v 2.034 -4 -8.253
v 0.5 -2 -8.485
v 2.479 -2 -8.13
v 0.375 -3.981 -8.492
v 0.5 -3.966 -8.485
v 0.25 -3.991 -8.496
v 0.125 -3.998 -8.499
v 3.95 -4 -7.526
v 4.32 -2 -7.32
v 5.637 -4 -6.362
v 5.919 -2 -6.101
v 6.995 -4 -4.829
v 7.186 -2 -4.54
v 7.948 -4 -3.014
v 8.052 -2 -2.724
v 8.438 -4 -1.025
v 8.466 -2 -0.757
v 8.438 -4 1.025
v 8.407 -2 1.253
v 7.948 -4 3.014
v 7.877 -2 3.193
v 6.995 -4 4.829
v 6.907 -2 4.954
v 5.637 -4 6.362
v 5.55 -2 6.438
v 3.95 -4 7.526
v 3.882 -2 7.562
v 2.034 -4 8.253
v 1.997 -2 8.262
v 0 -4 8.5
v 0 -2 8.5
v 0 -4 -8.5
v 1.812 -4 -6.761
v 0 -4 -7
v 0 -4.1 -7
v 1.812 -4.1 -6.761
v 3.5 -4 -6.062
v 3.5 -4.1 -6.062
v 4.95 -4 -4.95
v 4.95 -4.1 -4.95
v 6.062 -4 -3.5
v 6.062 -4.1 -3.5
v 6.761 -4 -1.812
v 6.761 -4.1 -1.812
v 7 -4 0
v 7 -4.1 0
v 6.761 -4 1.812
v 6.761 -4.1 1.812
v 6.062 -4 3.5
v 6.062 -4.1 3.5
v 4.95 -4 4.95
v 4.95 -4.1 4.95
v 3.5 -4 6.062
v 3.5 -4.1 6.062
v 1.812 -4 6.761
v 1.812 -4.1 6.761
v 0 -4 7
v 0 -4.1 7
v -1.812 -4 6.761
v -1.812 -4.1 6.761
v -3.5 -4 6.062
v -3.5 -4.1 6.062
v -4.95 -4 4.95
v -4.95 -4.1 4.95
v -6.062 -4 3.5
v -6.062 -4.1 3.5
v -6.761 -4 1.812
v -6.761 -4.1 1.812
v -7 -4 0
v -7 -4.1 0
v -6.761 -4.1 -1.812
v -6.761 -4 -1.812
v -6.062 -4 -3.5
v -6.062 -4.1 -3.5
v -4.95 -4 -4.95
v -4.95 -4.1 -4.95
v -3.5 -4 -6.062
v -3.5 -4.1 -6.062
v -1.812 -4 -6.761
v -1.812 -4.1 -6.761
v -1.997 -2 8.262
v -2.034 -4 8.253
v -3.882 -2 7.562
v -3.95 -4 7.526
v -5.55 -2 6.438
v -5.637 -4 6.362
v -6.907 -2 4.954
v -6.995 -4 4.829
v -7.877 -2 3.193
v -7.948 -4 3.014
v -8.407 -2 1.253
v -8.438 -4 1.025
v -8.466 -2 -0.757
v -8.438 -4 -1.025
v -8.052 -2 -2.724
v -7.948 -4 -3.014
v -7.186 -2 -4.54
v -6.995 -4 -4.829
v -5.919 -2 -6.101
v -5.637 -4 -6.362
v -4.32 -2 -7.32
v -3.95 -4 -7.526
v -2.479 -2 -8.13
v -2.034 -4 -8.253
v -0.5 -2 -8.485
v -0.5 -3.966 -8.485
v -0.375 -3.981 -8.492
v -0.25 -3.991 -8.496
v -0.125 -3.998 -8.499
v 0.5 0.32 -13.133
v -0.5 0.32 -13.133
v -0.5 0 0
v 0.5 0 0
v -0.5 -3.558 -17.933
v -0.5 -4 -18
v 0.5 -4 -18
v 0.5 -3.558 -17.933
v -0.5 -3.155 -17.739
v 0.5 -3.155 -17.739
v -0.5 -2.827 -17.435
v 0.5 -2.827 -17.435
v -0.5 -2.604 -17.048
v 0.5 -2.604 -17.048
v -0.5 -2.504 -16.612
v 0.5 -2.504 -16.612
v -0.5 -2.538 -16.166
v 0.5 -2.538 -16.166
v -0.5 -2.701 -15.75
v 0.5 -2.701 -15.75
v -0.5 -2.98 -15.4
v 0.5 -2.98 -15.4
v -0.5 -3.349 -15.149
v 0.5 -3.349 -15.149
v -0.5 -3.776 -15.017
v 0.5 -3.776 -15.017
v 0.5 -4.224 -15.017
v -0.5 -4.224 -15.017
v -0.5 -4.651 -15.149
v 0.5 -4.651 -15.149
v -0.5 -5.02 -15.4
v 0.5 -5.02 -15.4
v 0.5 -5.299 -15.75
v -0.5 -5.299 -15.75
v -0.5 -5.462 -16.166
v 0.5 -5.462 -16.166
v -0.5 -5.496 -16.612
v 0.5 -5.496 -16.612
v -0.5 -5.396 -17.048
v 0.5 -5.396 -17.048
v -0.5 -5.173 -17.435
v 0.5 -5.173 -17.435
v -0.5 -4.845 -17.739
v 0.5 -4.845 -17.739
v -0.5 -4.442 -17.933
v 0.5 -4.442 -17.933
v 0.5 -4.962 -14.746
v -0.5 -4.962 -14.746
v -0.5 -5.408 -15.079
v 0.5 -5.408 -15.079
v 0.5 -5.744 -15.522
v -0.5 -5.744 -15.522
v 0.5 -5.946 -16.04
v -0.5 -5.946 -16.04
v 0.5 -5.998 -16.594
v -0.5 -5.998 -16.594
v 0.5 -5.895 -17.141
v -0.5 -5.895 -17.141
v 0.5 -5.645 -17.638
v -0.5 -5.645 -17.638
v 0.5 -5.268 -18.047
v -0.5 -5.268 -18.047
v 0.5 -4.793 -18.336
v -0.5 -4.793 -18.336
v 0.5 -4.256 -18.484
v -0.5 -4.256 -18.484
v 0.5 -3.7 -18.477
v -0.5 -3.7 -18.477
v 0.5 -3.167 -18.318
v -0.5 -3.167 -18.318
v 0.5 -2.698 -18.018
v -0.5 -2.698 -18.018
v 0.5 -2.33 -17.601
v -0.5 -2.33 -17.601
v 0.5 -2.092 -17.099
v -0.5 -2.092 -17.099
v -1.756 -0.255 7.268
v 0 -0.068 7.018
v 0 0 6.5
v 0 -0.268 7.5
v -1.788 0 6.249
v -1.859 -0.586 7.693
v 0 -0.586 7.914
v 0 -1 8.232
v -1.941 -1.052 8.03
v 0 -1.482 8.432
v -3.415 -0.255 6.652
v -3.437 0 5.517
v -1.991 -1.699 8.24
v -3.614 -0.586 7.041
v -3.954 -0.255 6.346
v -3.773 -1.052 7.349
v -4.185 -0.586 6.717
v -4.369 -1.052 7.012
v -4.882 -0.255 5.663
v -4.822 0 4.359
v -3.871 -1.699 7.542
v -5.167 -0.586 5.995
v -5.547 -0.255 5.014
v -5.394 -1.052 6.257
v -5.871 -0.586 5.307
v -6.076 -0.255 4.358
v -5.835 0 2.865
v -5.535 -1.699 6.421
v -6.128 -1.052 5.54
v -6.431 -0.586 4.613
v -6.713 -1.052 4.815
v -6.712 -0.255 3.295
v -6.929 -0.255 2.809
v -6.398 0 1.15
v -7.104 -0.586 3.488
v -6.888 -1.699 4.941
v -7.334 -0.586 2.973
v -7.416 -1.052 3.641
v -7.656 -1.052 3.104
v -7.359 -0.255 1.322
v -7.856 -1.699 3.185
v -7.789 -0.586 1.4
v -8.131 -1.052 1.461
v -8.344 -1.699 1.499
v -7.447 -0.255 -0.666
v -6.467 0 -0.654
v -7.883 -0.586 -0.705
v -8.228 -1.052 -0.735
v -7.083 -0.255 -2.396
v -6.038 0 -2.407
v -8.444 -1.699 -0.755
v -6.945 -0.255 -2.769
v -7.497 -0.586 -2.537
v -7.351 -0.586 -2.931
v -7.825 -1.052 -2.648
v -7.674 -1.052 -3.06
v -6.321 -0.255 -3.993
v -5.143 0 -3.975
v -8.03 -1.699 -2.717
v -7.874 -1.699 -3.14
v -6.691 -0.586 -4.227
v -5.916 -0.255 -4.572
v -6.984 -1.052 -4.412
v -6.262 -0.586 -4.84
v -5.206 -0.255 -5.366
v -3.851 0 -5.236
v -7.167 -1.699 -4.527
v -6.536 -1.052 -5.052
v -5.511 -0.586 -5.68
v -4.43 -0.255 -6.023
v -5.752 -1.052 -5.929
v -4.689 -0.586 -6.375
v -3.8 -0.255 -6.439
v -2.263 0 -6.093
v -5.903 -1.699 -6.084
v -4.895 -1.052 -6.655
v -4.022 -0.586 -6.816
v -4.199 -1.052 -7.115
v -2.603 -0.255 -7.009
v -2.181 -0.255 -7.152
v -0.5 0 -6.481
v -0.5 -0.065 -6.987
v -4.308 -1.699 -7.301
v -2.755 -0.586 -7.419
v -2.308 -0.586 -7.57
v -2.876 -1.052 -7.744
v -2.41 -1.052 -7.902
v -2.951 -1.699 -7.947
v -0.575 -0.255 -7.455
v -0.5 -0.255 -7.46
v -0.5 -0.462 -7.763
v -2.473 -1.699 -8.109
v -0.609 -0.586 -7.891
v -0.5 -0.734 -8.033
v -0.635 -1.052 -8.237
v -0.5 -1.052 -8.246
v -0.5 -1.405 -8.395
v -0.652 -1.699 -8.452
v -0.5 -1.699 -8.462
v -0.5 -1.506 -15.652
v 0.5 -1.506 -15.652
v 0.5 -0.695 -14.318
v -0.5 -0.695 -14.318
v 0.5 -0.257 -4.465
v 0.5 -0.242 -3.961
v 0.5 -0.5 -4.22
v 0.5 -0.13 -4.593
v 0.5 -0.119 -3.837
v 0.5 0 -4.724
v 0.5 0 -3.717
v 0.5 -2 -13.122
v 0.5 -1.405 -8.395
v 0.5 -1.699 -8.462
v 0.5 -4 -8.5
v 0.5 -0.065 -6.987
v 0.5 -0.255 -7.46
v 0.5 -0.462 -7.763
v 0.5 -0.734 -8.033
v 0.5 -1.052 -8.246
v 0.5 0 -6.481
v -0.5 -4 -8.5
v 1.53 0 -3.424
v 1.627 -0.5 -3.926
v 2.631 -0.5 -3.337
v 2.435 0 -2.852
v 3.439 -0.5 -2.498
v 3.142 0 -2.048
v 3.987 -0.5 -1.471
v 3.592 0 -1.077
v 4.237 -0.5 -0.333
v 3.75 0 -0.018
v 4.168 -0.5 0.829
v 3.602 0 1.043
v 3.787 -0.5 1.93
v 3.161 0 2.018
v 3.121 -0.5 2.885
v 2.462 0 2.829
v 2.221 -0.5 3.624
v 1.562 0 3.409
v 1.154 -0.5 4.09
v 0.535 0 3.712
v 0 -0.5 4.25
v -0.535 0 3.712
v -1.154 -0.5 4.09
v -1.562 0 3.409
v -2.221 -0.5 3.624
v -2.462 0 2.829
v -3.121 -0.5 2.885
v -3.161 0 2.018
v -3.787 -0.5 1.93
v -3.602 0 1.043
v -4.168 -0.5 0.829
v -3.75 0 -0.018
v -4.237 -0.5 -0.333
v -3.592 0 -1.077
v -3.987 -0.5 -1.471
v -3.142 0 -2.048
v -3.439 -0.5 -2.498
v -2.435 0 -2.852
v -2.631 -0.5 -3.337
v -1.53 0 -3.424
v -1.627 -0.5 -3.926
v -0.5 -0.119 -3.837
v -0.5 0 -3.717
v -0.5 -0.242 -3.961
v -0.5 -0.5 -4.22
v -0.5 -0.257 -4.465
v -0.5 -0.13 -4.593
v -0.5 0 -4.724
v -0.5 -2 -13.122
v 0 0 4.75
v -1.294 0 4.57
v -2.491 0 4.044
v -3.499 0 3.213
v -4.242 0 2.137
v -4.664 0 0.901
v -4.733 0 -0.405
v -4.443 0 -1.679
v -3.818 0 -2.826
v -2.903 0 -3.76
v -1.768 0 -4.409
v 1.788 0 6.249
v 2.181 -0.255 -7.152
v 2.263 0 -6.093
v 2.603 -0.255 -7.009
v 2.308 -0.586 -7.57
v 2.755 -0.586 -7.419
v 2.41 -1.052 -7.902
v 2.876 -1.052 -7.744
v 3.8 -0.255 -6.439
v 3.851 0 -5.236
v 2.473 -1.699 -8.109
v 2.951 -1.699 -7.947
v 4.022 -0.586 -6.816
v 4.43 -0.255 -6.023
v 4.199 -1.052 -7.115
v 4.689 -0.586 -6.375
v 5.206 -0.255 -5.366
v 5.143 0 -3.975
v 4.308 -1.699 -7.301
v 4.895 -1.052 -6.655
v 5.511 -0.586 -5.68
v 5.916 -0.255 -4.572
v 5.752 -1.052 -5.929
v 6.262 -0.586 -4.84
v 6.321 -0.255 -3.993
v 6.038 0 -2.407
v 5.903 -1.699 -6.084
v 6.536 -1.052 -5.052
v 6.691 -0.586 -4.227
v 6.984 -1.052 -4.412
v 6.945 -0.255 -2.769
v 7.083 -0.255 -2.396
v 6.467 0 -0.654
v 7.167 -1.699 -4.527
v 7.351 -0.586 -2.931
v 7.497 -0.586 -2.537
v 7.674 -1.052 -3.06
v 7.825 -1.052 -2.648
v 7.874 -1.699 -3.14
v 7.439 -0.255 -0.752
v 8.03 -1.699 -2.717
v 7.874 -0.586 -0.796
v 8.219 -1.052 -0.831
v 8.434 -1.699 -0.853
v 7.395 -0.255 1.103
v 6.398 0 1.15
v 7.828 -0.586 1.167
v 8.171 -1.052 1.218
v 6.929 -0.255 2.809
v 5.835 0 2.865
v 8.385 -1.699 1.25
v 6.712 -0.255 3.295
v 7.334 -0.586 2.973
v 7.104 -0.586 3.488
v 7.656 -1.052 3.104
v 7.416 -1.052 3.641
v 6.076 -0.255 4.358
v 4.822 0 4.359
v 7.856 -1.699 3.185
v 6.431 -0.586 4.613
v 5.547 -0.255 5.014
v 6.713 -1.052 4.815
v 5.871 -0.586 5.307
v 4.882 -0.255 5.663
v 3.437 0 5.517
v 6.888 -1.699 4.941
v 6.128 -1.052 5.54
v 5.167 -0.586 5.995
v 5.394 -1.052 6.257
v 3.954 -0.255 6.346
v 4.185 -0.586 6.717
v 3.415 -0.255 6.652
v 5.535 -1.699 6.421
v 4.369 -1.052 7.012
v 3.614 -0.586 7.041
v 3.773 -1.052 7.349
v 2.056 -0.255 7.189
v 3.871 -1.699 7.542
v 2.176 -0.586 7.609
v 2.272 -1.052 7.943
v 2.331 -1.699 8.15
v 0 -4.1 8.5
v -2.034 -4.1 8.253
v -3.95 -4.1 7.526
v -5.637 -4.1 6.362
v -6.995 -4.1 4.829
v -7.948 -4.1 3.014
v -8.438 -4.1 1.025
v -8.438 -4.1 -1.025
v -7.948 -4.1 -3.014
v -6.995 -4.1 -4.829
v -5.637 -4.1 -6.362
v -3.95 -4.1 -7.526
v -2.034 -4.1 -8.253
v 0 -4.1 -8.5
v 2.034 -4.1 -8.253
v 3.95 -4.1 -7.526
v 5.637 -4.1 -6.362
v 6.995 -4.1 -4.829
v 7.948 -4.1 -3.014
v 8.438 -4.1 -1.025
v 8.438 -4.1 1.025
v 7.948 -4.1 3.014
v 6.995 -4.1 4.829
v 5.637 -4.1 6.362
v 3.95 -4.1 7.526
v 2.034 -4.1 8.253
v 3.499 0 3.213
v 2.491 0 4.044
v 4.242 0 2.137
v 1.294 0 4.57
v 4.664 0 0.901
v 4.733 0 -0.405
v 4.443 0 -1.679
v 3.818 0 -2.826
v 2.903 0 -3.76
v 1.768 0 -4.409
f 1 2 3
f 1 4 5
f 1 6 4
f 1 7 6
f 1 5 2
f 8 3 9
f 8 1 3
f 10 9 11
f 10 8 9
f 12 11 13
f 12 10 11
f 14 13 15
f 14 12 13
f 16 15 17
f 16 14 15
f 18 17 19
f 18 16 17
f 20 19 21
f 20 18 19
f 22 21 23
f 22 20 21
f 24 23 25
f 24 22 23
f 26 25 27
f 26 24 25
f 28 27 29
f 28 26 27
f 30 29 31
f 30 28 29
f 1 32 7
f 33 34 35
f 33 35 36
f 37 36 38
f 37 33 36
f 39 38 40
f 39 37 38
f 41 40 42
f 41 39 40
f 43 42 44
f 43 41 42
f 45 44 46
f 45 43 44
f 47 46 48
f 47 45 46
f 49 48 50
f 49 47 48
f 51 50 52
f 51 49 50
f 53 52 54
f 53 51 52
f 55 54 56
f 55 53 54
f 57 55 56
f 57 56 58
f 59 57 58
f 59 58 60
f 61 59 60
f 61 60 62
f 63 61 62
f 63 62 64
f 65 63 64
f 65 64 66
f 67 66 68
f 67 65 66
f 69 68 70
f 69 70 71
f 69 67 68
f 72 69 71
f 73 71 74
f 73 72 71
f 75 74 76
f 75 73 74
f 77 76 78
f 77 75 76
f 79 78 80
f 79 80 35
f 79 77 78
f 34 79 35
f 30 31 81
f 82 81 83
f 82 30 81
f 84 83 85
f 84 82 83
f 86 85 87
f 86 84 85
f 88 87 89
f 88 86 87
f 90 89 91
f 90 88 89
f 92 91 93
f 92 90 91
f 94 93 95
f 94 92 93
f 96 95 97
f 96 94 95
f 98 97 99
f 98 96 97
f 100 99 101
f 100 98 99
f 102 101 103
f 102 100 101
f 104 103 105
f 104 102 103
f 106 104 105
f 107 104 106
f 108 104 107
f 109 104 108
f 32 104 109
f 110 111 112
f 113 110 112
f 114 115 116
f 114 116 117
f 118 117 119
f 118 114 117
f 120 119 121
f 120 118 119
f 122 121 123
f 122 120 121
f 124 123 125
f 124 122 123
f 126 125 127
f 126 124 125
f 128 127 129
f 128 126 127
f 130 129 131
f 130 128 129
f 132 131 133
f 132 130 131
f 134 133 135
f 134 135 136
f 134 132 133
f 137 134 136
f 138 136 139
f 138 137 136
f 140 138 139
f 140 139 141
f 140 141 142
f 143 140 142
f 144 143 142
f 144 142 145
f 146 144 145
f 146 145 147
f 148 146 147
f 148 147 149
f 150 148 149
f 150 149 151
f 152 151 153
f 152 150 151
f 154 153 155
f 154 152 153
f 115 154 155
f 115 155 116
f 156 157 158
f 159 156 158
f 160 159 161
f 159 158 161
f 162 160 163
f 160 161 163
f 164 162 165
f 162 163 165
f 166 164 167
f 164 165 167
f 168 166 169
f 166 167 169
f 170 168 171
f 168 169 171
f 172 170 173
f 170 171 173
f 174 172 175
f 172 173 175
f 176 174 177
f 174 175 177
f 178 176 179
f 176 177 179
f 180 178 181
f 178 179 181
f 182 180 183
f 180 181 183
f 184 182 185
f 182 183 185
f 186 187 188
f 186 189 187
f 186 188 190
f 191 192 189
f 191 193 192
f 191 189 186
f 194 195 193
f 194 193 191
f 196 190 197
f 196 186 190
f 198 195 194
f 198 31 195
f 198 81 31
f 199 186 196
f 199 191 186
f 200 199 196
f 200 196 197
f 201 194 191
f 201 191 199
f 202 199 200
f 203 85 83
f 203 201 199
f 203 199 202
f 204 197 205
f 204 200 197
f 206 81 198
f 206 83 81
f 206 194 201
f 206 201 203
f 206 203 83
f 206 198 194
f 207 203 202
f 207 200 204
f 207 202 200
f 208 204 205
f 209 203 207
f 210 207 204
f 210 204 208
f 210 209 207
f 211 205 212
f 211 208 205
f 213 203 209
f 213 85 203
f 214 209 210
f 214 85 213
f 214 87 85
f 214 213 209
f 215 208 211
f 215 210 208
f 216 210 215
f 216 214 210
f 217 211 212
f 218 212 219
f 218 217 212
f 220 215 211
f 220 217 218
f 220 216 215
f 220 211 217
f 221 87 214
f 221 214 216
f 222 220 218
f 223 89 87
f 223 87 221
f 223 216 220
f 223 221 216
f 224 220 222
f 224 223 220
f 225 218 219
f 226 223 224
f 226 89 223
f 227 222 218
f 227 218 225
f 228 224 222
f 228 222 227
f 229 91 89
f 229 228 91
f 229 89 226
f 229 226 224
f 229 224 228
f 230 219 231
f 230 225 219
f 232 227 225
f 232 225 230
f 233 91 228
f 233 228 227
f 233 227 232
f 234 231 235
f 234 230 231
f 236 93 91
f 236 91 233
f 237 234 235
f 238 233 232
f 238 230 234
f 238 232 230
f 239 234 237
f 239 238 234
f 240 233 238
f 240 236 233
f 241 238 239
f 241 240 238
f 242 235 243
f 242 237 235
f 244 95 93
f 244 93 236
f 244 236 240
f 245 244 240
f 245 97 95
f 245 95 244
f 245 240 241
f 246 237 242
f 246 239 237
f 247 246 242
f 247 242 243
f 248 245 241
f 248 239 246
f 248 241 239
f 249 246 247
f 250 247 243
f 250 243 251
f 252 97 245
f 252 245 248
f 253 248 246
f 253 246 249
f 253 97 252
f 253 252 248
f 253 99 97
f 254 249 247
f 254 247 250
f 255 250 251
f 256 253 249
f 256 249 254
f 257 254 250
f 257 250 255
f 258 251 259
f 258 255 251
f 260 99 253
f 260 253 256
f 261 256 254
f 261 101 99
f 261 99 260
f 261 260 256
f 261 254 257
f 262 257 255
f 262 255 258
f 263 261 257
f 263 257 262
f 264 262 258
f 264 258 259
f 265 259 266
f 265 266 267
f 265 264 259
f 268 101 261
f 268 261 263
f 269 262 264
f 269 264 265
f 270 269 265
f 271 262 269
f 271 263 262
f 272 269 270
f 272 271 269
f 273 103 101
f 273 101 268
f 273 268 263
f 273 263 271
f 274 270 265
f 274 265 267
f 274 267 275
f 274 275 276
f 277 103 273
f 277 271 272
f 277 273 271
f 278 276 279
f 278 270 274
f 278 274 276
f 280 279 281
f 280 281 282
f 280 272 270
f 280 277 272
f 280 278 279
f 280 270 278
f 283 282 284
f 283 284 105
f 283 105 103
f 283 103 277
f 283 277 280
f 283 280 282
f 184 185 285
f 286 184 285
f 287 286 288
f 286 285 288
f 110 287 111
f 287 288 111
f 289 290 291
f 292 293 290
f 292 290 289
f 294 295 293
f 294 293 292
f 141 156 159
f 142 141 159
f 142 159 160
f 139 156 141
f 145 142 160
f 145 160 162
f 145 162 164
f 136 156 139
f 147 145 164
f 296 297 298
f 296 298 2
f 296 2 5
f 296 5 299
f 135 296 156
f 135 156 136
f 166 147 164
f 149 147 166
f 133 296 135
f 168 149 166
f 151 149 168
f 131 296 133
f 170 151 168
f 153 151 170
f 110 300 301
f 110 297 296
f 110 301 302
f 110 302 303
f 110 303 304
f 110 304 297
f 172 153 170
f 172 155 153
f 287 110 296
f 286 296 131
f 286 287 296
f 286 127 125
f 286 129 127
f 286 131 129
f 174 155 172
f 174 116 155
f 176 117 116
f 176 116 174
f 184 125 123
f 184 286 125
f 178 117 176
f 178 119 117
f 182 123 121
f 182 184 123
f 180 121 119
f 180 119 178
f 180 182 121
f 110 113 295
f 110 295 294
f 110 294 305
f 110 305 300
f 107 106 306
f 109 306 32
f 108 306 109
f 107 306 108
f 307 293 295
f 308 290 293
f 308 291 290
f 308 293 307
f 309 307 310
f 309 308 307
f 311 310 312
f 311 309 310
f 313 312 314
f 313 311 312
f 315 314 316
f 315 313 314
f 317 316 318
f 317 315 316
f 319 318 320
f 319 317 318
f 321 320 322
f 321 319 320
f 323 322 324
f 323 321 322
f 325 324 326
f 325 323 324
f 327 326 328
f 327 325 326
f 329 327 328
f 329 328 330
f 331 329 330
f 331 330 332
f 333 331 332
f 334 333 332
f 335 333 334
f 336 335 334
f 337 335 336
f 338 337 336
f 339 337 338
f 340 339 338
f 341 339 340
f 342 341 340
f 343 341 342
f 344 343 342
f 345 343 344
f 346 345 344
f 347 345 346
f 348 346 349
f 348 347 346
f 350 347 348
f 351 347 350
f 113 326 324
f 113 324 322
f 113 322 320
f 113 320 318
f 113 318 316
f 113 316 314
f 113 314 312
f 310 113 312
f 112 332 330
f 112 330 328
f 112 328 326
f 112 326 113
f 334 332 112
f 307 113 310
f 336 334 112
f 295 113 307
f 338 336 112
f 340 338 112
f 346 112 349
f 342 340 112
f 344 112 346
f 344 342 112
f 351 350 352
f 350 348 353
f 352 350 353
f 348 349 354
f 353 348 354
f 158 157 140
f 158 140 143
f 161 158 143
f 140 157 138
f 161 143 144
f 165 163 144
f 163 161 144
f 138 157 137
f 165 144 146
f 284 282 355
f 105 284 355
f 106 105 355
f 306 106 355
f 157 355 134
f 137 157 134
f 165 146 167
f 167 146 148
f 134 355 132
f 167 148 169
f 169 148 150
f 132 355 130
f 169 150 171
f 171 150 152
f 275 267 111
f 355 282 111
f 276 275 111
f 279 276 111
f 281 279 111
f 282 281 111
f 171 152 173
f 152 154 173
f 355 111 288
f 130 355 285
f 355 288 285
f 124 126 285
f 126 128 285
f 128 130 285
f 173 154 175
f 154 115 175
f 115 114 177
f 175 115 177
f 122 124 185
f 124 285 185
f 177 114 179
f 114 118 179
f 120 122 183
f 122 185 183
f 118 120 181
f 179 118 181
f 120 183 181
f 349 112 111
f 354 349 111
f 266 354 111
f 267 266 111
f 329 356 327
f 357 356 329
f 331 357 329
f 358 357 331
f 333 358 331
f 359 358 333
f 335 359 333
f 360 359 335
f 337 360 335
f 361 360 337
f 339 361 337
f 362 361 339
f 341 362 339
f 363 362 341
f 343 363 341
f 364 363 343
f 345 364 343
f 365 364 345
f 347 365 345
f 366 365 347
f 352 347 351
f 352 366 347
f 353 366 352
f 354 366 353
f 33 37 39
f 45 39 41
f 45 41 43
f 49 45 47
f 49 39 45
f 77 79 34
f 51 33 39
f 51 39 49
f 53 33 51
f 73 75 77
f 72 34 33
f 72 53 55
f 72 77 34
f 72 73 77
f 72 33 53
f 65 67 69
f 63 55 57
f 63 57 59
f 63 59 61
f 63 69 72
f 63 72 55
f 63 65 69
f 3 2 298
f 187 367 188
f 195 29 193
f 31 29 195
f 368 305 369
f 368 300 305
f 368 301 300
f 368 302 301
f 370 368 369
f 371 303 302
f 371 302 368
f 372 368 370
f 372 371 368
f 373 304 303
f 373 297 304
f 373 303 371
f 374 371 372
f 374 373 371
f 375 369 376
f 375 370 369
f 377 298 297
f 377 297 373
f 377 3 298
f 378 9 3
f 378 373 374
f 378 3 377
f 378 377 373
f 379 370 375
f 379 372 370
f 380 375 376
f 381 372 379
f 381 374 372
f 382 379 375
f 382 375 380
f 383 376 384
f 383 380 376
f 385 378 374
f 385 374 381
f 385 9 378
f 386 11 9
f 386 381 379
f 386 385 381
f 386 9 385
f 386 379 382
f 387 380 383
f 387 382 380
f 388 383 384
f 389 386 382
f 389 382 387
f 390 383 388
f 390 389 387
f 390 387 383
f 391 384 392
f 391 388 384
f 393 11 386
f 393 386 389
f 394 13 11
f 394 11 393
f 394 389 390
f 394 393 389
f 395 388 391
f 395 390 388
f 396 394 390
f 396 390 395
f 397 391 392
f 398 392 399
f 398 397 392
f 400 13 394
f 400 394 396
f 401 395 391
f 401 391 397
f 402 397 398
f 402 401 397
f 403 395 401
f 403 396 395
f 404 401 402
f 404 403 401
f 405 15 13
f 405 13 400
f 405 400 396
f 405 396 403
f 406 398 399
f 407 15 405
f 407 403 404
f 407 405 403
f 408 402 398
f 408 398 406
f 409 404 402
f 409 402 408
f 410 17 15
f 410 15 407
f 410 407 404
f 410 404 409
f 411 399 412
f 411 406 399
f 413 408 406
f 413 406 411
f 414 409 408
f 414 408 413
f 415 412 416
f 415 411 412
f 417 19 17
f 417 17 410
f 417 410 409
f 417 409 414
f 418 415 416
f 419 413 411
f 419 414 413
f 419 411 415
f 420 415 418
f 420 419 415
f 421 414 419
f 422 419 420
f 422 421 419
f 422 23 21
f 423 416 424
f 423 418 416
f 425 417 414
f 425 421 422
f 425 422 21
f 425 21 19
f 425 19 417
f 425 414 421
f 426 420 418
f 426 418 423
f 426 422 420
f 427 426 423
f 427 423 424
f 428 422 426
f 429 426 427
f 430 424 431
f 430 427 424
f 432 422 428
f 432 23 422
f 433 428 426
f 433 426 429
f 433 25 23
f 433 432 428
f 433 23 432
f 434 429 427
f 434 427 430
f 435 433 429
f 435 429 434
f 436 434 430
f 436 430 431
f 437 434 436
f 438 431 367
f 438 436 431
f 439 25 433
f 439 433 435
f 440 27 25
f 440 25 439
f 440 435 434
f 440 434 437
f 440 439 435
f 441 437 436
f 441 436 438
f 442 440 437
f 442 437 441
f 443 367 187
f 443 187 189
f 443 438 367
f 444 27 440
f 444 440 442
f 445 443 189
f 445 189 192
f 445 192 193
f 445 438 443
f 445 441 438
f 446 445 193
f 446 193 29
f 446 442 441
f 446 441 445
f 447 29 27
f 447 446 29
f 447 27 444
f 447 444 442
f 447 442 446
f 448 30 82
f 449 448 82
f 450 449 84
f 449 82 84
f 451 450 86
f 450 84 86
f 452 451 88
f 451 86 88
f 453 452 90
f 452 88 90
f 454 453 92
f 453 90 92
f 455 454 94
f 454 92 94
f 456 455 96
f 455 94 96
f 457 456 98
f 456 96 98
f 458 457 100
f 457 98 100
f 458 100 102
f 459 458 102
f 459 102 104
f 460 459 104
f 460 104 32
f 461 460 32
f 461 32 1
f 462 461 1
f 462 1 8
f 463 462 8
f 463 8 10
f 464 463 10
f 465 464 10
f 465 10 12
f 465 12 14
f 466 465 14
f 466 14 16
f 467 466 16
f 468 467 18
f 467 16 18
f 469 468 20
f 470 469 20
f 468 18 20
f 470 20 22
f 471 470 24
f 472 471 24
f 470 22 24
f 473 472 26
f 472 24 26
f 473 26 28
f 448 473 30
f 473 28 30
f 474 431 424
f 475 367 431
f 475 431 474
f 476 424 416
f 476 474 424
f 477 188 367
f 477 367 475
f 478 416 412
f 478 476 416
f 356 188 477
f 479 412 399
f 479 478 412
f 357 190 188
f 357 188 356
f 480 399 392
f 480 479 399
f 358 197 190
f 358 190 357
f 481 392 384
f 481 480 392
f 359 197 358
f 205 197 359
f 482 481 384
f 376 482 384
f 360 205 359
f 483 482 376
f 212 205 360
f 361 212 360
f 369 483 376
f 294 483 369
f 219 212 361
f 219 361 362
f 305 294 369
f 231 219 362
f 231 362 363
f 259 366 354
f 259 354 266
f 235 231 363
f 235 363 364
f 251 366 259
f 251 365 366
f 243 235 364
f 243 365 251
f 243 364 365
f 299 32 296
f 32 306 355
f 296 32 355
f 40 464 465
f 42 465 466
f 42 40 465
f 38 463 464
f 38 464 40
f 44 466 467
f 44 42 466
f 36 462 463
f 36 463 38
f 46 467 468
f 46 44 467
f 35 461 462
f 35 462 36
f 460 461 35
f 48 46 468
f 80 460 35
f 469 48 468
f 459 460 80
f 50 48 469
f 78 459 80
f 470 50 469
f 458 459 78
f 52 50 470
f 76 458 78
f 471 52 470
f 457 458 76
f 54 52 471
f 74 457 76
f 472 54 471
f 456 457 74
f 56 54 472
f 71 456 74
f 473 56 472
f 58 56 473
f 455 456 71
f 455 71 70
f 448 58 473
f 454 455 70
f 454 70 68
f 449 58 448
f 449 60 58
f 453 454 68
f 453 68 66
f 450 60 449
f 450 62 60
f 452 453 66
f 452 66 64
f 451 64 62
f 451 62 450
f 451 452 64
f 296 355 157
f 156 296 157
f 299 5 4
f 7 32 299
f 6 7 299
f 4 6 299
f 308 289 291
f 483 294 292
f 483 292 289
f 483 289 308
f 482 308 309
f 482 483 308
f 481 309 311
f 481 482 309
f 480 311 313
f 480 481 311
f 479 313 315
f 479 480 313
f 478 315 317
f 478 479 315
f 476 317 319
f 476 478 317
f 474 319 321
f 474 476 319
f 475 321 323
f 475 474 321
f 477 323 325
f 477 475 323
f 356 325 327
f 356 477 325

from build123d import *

# Parameters (mm, degrees)
FILLET1_R                = 2
SKETCH5_R                = 8.5
SKETCH5_R_2              = 7
BOSS_EXTRUDE1_DEPTH      = 0.1
BOSS_EXTRUDE2_DEPTH      = 0.5
BOSS_EXTRUDE2_DEPTH_BACK = 0.5
SKETCH6_R                = 1.5


with BuildPart() as part:
    # Sketch4 → Revolve1 (revolve)
    with BuildSketch(Plane(origin=(0, 0, 0), x_dir=(0, 0, -1), z_dir=(1, 0, 0))):
        Polygon((0, 0), (-3.75, 0), (-4.25, -0.5), (-4.75, 0), (-8.5, 0), (-8.5, -4), (0, -4), align=None)
    revolve(axis=Axis((0, 1.890471386, 0), (0, -1, 0)))

    # Fillet1
    fillet1_edges = [part.edges().sort_by_distance(p)[0] for p in [
        (0, 0, -8.5),
    ]]
    fillet(fillet1_edges, radius=FILLET1_R)



with BuildPart() as body_2:
    # Sketch5 → Boss-Extrude1 (new body)
    with BuildSketch(Plane.XZ.offset(4)):
        Circle(SKETCH5_R)
        Circle(SKETCH5_R_2, mode=Mode.SUBTRACT)
    extrude(amount=BOSS_EXTRUDE1_DEPTH)


with BuildPart() as part_1:
    add(part.part)

    add(body_2.part)  # Boss-Extrude2 merges body 2
    # Sketch6 → Boss-Extrude2 (add, two sides: drawn at the far end of the back side and taken through both)
    with BuildSketch(Plane(origin=(0, 0, 0), x_dir=(0, 0, -1), z_dir=(1, 0, 0)).offset(-BOSS_EXTRUDE2_DEPTH_BACK)):
        with BuildLine():
            Line((13.132863069, 0.320027848), (0, 0))
            Line((0, 0), (0, -0.907670556))
            Line((0, -0.907670556), (7.174444166, -0.907670556))
            Line((7.174444166, -0.907670556), (8.5, -4))
            Line((8.5, -4), (13.12184584, -1.999779955))
            Line((13.12184584, -1.999779955), (14.746442499, -4.961787965))
            ThreePointArc((14.746442499, -4.961787965), (18.046890478, -5.267726252), (17.098589091, -2.09167846))
            ThreePointArc((17.098589091, -2.09167846), (14.968839585, -1.127360353), (13.132863069, 0.320027848))
        make_face()
        with Locations((16.5, -4)):
            Circle(SKETCH6_R, mode=Mode.SUBTRACT)
    extrude(amount=BOSS_EXTRUDE2_DEPTH + BOSS_EXTRUDE2_DEPTH_BACK)


solid = part_1.part
